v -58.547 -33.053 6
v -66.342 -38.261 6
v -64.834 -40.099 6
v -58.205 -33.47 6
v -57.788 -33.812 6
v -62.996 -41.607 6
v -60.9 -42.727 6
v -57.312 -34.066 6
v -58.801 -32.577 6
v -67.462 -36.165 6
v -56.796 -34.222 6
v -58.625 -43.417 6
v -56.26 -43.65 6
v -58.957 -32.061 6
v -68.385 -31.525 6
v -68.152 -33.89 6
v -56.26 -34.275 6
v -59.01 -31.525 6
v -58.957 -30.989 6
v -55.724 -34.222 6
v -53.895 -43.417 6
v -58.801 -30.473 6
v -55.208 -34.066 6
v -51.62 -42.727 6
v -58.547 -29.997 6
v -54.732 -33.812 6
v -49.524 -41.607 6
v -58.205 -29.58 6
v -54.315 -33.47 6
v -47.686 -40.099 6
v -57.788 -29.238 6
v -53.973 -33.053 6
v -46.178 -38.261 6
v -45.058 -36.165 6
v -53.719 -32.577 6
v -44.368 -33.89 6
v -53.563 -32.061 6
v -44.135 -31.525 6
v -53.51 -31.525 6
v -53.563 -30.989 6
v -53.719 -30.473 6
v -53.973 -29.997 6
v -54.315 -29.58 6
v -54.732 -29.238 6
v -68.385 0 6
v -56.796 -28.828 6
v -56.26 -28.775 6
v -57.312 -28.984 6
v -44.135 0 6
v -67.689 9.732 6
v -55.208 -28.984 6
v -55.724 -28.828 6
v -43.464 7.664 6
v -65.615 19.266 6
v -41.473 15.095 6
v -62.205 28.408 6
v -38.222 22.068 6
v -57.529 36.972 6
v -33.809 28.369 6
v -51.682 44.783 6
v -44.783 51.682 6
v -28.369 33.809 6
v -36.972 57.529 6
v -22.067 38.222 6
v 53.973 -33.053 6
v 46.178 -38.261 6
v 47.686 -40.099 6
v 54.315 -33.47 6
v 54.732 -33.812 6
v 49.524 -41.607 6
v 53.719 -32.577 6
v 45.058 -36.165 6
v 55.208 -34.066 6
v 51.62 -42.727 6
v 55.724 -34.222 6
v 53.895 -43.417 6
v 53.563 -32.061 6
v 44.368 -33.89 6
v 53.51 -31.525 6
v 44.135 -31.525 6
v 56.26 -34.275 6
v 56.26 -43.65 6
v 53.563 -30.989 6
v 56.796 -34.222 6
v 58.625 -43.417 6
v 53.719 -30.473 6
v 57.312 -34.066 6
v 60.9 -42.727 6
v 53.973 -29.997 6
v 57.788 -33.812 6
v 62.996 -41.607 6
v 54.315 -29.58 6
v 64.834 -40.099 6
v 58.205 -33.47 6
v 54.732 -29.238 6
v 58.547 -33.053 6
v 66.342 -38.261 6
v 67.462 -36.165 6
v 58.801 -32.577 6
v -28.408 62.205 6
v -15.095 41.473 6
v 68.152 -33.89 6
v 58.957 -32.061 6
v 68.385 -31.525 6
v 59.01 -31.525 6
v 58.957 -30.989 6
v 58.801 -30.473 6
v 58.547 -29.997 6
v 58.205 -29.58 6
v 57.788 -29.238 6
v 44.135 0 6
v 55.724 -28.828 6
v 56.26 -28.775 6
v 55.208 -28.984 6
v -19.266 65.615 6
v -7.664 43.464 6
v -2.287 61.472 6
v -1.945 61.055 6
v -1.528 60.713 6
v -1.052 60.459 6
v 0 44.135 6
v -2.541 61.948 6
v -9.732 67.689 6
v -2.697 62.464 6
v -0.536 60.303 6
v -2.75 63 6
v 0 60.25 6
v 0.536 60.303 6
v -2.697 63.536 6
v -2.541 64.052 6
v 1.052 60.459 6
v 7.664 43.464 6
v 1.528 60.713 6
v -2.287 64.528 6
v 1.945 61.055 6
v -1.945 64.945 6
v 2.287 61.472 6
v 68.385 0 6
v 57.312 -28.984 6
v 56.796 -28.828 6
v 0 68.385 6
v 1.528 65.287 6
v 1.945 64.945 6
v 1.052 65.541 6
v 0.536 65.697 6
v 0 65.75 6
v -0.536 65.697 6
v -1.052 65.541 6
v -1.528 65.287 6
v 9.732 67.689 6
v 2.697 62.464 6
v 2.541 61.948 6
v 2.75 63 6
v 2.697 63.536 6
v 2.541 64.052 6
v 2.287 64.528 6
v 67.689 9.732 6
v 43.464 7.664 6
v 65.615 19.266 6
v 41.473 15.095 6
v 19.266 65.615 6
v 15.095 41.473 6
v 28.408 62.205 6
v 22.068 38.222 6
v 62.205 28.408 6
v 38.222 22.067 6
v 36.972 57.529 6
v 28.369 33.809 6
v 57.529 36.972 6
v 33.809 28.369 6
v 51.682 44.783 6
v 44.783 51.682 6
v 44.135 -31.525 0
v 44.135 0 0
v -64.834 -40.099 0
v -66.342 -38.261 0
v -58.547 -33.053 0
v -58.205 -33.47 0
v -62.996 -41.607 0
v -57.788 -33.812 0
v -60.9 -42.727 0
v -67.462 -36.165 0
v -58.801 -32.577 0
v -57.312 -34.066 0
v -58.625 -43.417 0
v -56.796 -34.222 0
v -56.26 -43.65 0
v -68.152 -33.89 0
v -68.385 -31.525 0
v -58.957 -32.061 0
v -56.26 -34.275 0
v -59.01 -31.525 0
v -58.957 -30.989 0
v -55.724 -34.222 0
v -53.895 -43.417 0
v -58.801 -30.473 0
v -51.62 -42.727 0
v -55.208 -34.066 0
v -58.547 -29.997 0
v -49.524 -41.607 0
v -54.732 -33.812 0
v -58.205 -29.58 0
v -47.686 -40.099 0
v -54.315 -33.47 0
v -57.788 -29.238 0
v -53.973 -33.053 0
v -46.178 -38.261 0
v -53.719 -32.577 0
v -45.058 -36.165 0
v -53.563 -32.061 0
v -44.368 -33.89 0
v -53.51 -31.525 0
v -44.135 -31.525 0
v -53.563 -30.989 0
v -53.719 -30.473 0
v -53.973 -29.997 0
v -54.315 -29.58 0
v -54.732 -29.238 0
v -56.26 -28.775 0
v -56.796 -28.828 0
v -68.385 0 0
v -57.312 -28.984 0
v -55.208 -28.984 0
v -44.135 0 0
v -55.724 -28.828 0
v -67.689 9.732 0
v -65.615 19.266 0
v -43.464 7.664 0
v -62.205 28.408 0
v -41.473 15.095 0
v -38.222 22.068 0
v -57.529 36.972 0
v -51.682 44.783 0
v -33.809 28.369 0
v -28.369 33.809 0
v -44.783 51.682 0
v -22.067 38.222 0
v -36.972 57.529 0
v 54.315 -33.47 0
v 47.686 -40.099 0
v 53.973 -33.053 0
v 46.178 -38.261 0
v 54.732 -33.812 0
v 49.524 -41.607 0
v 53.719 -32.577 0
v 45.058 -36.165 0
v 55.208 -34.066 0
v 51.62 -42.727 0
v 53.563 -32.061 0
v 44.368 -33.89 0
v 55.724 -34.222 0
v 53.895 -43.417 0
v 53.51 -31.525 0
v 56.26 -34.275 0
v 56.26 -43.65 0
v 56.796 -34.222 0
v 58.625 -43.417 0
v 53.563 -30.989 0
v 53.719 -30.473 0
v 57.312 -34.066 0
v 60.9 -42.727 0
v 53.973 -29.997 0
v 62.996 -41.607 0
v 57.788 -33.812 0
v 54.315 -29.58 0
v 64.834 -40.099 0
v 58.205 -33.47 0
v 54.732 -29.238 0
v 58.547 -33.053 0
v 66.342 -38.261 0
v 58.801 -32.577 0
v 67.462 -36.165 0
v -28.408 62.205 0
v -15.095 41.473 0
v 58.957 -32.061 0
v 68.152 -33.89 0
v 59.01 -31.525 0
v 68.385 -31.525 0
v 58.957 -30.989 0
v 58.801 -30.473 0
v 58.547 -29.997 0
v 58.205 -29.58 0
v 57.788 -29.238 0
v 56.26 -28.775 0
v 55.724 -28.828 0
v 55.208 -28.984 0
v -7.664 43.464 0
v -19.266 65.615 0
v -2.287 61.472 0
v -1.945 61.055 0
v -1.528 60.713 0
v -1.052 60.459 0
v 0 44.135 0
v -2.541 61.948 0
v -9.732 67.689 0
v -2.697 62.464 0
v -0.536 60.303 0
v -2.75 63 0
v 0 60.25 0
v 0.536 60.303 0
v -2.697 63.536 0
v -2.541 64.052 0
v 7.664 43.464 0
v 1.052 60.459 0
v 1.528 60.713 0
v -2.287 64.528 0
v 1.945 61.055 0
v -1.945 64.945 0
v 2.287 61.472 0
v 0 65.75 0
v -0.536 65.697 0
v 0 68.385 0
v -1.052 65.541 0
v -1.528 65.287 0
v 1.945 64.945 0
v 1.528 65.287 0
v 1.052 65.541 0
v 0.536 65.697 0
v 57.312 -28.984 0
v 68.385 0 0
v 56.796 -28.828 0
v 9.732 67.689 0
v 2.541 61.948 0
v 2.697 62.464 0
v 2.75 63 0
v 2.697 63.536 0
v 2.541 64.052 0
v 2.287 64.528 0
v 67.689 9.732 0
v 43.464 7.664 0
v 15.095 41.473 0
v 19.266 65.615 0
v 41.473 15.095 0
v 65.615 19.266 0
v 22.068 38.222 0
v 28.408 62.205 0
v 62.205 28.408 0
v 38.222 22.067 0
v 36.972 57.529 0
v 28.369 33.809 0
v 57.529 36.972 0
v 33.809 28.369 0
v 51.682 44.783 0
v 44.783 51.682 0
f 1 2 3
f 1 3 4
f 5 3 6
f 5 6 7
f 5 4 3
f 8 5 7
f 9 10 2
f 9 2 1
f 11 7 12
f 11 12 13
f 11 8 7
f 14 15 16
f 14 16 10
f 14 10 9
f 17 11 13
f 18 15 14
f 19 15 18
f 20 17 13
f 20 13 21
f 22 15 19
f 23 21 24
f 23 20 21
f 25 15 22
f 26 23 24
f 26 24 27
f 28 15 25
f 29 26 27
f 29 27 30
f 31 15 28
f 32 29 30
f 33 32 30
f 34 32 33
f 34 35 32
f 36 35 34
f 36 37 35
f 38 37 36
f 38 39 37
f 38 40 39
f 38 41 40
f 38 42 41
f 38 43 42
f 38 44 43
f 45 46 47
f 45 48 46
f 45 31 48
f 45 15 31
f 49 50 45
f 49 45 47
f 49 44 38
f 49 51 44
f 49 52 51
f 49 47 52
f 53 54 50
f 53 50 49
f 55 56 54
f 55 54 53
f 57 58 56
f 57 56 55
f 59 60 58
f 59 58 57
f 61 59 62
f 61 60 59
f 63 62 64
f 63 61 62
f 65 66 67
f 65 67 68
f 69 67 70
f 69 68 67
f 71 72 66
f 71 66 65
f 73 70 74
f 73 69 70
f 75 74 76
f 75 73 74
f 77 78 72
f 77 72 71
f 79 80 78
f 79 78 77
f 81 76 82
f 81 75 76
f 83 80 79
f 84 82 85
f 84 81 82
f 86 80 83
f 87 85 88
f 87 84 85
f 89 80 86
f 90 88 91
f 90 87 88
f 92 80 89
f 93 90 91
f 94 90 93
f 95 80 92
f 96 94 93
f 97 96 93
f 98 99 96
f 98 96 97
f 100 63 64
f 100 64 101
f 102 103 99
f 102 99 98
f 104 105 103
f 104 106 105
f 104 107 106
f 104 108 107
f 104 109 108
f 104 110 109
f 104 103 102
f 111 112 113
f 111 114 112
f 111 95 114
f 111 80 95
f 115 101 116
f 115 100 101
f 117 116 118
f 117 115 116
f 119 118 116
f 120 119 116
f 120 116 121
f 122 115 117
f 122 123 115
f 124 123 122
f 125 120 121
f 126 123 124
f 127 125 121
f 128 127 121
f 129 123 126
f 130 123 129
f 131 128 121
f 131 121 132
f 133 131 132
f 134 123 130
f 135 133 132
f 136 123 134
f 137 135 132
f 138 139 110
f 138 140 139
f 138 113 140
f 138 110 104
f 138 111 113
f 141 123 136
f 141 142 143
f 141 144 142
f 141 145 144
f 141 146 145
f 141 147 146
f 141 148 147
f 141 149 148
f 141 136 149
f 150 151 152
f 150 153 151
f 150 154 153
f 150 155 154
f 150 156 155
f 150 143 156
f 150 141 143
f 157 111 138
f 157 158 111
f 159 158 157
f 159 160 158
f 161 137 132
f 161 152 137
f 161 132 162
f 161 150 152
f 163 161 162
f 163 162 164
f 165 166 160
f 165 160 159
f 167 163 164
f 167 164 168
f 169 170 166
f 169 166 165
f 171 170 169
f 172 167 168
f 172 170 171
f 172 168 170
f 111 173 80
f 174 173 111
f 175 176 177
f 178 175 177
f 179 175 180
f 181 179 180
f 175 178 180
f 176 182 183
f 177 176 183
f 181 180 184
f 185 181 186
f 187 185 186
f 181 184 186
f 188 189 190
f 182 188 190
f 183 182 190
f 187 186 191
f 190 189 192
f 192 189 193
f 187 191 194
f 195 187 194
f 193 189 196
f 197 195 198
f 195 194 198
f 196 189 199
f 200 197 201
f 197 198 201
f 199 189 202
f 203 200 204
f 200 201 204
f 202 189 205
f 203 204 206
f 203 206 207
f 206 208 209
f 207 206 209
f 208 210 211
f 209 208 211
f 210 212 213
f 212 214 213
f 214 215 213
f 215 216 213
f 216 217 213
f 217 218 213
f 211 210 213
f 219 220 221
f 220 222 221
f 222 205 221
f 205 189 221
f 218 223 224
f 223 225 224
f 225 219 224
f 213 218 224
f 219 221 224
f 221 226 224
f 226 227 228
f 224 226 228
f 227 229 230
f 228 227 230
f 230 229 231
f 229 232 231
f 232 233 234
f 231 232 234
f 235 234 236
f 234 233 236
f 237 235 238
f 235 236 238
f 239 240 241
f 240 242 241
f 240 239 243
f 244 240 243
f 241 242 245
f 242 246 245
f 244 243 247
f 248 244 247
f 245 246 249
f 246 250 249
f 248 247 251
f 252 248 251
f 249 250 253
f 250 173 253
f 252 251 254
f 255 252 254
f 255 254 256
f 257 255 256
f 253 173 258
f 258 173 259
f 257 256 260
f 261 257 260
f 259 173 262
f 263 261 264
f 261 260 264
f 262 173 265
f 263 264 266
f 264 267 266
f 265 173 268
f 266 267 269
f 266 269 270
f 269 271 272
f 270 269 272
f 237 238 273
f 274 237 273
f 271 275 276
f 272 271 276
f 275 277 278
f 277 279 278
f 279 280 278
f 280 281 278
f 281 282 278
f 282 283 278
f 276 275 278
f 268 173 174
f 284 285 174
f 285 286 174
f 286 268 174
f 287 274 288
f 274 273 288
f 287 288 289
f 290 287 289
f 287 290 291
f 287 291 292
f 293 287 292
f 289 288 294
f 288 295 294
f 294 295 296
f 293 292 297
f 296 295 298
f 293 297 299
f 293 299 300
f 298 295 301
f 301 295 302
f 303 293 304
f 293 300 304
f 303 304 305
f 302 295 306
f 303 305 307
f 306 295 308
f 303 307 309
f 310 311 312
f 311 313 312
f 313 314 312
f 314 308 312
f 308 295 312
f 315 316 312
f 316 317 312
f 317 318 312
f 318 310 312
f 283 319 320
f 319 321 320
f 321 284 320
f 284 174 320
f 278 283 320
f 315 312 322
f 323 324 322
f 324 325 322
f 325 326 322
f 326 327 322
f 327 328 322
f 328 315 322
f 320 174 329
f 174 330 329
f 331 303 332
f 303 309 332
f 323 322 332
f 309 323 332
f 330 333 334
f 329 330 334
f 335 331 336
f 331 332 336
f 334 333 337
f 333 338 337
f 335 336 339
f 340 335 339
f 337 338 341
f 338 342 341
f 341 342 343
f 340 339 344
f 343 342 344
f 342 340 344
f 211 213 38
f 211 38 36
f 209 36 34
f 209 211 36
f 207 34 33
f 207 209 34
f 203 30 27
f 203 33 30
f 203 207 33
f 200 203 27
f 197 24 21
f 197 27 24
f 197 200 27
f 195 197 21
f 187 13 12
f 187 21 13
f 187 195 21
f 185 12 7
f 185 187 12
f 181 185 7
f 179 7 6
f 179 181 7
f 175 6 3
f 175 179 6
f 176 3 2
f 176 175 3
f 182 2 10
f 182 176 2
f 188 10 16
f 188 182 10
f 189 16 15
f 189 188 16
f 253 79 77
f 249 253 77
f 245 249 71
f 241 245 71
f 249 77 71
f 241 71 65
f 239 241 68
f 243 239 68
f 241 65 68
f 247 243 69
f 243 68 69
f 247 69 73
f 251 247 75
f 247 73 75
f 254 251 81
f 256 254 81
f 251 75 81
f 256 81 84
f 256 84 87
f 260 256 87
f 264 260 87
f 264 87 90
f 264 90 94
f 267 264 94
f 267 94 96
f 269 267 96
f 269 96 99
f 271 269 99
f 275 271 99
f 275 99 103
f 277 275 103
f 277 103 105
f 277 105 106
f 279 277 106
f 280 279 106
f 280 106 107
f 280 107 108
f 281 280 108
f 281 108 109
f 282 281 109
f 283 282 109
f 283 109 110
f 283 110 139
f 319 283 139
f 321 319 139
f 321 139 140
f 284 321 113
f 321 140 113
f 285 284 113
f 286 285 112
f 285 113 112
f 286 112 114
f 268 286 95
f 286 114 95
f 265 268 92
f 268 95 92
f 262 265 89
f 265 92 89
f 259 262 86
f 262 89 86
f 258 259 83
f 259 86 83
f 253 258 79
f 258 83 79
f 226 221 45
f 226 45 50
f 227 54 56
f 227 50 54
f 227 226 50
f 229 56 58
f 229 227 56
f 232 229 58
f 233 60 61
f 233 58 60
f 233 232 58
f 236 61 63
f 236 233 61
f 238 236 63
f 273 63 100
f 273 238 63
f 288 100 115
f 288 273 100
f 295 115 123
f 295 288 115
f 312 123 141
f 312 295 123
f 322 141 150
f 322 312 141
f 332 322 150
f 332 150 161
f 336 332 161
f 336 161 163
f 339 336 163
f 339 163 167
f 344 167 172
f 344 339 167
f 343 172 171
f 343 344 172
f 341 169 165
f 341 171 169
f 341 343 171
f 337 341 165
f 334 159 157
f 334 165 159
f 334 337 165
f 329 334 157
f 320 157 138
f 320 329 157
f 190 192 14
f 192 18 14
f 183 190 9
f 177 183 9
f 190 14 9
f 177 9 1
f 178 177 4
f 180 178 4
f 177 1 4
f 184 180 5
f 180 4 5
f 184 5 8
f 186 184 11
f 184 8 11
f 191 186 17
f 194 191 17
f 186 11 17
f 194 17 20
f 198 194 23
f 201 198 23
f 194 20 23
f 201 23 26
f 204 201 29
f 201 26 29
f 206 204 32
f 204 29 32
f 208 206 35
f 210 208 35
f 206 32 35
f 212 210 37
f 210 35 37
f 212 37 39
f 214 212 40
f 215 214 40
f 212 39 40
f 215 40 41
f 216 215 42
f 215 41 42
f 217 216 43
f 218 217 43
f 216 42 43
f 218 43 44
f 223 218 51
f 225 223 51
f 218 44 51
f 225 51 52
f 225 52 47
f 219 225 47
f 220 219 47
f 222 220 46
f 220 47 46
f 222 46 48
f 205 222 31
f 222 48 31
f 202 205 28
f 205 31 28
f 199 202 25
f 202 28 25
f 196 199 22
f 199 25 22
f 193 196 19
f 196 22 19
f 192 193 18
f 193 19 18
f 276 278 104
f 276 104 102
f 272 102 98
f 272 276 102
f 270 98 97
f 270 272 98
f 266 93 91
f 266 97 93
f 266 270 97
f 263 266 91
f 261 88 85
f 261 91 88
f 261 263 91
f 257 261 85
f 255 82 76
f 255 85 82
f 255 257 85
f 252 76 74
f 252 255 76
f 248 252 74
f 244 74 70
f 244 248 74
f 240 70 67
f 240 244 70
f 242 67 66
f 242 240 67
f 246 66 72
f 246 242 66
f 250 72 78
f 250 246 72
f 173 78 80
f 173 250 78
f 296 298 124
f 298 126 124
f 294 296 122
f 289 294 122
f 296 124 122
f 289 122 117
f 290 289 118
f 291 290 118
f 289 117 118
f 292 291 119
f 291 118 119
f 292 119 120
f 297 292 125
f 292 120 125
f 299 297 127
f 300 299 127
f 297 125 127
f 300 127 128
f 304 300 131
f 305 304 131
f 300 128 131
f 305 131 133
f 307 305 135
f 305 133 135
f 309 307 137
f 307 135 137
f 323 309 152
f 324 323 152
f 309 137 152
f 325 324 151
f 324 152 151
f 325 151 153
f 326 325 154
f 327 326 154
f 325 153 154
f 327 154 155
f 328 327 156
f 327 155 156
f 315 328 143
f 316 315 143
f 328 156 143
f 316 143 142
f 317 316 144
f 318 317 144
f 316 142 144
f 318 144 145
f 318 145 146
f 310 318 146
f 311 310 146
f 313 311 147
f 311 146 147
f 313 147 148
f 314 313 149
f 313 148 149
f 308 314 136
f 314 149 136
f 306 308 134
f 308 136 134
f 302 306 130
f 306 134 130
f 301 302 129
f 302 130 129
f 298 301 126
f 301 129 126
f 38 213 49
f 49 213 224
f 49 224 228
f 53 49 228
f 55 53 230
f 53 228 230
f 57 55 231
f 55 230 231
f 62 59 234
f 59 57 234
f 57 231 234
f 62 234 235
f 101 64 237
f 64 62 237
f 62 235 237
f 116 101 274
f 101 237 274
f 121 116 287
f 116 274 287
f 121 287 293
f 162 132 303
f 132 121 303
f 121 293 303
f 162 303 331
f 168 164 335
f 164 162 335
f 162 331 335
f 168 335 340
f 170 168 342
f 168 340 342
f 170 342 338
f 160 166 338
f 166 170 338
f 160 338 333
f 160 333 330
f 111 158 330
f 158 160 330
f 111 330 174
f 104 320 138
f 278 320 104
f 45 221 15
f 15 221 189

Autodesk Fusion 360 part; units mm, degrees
sketch "Sketch1" plane through (0, 0, 0) normal (0, 0, 1) x (1, 0, 0)
  line L0 (68.385, 0) -> (68.385, -31.04)
  line L1 (44.135, 0) -> (44.135, -31.04)
  line L2 (68.385, -31.525) -> (68.385, -31.04)
  line L3 (44.135, -31.525) -> (44.135, -31.04)
  line L4 (-68.385, 0) -> (-68.385, -31.04)
  line L5 (-44.135, 0) -> (-44.135, -31.04)
  line L6 (-68.385, -31.525) -> (-68.385, -31.04)
  line L7 (-44.135, -31.525) -> (-44.135, -31.04)
  arc A0 (44.135, 0) -> (-44.135, 0) centre (0, 0) ccw
  arc A1 (68.385, 0) -> (-68.385, 0) centre (0, 0) ccw
  arc A2 (44.135, -31.525) -> (68.385, -31.525) centre (56.26, -31.525) ccw
  arc A3 (-68.385, -31.525) -> (-44.135, -31.525) centre (-56.26, -31.525) ccw
extrude "Extrude5" add sketch "Sketch1" along normal blind 6
sketch "Sketch4" plane through (0, 0, 0) normal (0, 0, 1) x (1, 0, 0)
sketch "Sketch5" plane through (0, 0, 6) normal (0, 0, 1) x (-1, 0, 0)
  arc A0 (-68.385, 0) -> (68.385, 0) centre (0, 0) ccw
  line L0 (68.385, 0) -> (68.385, 31.525)
  arc A1 (68.385, 31.525) -> (44.135, 31.525) centre (56.26, 31.525) ccw
  line L1 (44.135, 31.525) -> (44.135, 0)
  arc A2 (-44.135, 0) -> (44.135, 0) centre (0, 0) ccw
  line L2 (-44.135, 0) -> (-44.135, 31.525)
  arc A3 (-44.135, 31.525) -> (-68.385, 31.525) centre (-56.26, 31.525) ccw
  line L3 (-68.385, 31.525) -> (-68.385, 0)
  circle A4 centre (56.26, 31.525) radius 2.75
  circle A5 centre (-56.26, 31.525) radius 2.75
  circle A6 centre (0, -63) radius 2.75
  dimension "d79" = 5.5
  dimension "d80" = 5.5
  dimension "d82" = 5.5
extrude "Extrude6" cut sketch "Sketch5" against normal blind 6 contours A4 | A5 | A6
